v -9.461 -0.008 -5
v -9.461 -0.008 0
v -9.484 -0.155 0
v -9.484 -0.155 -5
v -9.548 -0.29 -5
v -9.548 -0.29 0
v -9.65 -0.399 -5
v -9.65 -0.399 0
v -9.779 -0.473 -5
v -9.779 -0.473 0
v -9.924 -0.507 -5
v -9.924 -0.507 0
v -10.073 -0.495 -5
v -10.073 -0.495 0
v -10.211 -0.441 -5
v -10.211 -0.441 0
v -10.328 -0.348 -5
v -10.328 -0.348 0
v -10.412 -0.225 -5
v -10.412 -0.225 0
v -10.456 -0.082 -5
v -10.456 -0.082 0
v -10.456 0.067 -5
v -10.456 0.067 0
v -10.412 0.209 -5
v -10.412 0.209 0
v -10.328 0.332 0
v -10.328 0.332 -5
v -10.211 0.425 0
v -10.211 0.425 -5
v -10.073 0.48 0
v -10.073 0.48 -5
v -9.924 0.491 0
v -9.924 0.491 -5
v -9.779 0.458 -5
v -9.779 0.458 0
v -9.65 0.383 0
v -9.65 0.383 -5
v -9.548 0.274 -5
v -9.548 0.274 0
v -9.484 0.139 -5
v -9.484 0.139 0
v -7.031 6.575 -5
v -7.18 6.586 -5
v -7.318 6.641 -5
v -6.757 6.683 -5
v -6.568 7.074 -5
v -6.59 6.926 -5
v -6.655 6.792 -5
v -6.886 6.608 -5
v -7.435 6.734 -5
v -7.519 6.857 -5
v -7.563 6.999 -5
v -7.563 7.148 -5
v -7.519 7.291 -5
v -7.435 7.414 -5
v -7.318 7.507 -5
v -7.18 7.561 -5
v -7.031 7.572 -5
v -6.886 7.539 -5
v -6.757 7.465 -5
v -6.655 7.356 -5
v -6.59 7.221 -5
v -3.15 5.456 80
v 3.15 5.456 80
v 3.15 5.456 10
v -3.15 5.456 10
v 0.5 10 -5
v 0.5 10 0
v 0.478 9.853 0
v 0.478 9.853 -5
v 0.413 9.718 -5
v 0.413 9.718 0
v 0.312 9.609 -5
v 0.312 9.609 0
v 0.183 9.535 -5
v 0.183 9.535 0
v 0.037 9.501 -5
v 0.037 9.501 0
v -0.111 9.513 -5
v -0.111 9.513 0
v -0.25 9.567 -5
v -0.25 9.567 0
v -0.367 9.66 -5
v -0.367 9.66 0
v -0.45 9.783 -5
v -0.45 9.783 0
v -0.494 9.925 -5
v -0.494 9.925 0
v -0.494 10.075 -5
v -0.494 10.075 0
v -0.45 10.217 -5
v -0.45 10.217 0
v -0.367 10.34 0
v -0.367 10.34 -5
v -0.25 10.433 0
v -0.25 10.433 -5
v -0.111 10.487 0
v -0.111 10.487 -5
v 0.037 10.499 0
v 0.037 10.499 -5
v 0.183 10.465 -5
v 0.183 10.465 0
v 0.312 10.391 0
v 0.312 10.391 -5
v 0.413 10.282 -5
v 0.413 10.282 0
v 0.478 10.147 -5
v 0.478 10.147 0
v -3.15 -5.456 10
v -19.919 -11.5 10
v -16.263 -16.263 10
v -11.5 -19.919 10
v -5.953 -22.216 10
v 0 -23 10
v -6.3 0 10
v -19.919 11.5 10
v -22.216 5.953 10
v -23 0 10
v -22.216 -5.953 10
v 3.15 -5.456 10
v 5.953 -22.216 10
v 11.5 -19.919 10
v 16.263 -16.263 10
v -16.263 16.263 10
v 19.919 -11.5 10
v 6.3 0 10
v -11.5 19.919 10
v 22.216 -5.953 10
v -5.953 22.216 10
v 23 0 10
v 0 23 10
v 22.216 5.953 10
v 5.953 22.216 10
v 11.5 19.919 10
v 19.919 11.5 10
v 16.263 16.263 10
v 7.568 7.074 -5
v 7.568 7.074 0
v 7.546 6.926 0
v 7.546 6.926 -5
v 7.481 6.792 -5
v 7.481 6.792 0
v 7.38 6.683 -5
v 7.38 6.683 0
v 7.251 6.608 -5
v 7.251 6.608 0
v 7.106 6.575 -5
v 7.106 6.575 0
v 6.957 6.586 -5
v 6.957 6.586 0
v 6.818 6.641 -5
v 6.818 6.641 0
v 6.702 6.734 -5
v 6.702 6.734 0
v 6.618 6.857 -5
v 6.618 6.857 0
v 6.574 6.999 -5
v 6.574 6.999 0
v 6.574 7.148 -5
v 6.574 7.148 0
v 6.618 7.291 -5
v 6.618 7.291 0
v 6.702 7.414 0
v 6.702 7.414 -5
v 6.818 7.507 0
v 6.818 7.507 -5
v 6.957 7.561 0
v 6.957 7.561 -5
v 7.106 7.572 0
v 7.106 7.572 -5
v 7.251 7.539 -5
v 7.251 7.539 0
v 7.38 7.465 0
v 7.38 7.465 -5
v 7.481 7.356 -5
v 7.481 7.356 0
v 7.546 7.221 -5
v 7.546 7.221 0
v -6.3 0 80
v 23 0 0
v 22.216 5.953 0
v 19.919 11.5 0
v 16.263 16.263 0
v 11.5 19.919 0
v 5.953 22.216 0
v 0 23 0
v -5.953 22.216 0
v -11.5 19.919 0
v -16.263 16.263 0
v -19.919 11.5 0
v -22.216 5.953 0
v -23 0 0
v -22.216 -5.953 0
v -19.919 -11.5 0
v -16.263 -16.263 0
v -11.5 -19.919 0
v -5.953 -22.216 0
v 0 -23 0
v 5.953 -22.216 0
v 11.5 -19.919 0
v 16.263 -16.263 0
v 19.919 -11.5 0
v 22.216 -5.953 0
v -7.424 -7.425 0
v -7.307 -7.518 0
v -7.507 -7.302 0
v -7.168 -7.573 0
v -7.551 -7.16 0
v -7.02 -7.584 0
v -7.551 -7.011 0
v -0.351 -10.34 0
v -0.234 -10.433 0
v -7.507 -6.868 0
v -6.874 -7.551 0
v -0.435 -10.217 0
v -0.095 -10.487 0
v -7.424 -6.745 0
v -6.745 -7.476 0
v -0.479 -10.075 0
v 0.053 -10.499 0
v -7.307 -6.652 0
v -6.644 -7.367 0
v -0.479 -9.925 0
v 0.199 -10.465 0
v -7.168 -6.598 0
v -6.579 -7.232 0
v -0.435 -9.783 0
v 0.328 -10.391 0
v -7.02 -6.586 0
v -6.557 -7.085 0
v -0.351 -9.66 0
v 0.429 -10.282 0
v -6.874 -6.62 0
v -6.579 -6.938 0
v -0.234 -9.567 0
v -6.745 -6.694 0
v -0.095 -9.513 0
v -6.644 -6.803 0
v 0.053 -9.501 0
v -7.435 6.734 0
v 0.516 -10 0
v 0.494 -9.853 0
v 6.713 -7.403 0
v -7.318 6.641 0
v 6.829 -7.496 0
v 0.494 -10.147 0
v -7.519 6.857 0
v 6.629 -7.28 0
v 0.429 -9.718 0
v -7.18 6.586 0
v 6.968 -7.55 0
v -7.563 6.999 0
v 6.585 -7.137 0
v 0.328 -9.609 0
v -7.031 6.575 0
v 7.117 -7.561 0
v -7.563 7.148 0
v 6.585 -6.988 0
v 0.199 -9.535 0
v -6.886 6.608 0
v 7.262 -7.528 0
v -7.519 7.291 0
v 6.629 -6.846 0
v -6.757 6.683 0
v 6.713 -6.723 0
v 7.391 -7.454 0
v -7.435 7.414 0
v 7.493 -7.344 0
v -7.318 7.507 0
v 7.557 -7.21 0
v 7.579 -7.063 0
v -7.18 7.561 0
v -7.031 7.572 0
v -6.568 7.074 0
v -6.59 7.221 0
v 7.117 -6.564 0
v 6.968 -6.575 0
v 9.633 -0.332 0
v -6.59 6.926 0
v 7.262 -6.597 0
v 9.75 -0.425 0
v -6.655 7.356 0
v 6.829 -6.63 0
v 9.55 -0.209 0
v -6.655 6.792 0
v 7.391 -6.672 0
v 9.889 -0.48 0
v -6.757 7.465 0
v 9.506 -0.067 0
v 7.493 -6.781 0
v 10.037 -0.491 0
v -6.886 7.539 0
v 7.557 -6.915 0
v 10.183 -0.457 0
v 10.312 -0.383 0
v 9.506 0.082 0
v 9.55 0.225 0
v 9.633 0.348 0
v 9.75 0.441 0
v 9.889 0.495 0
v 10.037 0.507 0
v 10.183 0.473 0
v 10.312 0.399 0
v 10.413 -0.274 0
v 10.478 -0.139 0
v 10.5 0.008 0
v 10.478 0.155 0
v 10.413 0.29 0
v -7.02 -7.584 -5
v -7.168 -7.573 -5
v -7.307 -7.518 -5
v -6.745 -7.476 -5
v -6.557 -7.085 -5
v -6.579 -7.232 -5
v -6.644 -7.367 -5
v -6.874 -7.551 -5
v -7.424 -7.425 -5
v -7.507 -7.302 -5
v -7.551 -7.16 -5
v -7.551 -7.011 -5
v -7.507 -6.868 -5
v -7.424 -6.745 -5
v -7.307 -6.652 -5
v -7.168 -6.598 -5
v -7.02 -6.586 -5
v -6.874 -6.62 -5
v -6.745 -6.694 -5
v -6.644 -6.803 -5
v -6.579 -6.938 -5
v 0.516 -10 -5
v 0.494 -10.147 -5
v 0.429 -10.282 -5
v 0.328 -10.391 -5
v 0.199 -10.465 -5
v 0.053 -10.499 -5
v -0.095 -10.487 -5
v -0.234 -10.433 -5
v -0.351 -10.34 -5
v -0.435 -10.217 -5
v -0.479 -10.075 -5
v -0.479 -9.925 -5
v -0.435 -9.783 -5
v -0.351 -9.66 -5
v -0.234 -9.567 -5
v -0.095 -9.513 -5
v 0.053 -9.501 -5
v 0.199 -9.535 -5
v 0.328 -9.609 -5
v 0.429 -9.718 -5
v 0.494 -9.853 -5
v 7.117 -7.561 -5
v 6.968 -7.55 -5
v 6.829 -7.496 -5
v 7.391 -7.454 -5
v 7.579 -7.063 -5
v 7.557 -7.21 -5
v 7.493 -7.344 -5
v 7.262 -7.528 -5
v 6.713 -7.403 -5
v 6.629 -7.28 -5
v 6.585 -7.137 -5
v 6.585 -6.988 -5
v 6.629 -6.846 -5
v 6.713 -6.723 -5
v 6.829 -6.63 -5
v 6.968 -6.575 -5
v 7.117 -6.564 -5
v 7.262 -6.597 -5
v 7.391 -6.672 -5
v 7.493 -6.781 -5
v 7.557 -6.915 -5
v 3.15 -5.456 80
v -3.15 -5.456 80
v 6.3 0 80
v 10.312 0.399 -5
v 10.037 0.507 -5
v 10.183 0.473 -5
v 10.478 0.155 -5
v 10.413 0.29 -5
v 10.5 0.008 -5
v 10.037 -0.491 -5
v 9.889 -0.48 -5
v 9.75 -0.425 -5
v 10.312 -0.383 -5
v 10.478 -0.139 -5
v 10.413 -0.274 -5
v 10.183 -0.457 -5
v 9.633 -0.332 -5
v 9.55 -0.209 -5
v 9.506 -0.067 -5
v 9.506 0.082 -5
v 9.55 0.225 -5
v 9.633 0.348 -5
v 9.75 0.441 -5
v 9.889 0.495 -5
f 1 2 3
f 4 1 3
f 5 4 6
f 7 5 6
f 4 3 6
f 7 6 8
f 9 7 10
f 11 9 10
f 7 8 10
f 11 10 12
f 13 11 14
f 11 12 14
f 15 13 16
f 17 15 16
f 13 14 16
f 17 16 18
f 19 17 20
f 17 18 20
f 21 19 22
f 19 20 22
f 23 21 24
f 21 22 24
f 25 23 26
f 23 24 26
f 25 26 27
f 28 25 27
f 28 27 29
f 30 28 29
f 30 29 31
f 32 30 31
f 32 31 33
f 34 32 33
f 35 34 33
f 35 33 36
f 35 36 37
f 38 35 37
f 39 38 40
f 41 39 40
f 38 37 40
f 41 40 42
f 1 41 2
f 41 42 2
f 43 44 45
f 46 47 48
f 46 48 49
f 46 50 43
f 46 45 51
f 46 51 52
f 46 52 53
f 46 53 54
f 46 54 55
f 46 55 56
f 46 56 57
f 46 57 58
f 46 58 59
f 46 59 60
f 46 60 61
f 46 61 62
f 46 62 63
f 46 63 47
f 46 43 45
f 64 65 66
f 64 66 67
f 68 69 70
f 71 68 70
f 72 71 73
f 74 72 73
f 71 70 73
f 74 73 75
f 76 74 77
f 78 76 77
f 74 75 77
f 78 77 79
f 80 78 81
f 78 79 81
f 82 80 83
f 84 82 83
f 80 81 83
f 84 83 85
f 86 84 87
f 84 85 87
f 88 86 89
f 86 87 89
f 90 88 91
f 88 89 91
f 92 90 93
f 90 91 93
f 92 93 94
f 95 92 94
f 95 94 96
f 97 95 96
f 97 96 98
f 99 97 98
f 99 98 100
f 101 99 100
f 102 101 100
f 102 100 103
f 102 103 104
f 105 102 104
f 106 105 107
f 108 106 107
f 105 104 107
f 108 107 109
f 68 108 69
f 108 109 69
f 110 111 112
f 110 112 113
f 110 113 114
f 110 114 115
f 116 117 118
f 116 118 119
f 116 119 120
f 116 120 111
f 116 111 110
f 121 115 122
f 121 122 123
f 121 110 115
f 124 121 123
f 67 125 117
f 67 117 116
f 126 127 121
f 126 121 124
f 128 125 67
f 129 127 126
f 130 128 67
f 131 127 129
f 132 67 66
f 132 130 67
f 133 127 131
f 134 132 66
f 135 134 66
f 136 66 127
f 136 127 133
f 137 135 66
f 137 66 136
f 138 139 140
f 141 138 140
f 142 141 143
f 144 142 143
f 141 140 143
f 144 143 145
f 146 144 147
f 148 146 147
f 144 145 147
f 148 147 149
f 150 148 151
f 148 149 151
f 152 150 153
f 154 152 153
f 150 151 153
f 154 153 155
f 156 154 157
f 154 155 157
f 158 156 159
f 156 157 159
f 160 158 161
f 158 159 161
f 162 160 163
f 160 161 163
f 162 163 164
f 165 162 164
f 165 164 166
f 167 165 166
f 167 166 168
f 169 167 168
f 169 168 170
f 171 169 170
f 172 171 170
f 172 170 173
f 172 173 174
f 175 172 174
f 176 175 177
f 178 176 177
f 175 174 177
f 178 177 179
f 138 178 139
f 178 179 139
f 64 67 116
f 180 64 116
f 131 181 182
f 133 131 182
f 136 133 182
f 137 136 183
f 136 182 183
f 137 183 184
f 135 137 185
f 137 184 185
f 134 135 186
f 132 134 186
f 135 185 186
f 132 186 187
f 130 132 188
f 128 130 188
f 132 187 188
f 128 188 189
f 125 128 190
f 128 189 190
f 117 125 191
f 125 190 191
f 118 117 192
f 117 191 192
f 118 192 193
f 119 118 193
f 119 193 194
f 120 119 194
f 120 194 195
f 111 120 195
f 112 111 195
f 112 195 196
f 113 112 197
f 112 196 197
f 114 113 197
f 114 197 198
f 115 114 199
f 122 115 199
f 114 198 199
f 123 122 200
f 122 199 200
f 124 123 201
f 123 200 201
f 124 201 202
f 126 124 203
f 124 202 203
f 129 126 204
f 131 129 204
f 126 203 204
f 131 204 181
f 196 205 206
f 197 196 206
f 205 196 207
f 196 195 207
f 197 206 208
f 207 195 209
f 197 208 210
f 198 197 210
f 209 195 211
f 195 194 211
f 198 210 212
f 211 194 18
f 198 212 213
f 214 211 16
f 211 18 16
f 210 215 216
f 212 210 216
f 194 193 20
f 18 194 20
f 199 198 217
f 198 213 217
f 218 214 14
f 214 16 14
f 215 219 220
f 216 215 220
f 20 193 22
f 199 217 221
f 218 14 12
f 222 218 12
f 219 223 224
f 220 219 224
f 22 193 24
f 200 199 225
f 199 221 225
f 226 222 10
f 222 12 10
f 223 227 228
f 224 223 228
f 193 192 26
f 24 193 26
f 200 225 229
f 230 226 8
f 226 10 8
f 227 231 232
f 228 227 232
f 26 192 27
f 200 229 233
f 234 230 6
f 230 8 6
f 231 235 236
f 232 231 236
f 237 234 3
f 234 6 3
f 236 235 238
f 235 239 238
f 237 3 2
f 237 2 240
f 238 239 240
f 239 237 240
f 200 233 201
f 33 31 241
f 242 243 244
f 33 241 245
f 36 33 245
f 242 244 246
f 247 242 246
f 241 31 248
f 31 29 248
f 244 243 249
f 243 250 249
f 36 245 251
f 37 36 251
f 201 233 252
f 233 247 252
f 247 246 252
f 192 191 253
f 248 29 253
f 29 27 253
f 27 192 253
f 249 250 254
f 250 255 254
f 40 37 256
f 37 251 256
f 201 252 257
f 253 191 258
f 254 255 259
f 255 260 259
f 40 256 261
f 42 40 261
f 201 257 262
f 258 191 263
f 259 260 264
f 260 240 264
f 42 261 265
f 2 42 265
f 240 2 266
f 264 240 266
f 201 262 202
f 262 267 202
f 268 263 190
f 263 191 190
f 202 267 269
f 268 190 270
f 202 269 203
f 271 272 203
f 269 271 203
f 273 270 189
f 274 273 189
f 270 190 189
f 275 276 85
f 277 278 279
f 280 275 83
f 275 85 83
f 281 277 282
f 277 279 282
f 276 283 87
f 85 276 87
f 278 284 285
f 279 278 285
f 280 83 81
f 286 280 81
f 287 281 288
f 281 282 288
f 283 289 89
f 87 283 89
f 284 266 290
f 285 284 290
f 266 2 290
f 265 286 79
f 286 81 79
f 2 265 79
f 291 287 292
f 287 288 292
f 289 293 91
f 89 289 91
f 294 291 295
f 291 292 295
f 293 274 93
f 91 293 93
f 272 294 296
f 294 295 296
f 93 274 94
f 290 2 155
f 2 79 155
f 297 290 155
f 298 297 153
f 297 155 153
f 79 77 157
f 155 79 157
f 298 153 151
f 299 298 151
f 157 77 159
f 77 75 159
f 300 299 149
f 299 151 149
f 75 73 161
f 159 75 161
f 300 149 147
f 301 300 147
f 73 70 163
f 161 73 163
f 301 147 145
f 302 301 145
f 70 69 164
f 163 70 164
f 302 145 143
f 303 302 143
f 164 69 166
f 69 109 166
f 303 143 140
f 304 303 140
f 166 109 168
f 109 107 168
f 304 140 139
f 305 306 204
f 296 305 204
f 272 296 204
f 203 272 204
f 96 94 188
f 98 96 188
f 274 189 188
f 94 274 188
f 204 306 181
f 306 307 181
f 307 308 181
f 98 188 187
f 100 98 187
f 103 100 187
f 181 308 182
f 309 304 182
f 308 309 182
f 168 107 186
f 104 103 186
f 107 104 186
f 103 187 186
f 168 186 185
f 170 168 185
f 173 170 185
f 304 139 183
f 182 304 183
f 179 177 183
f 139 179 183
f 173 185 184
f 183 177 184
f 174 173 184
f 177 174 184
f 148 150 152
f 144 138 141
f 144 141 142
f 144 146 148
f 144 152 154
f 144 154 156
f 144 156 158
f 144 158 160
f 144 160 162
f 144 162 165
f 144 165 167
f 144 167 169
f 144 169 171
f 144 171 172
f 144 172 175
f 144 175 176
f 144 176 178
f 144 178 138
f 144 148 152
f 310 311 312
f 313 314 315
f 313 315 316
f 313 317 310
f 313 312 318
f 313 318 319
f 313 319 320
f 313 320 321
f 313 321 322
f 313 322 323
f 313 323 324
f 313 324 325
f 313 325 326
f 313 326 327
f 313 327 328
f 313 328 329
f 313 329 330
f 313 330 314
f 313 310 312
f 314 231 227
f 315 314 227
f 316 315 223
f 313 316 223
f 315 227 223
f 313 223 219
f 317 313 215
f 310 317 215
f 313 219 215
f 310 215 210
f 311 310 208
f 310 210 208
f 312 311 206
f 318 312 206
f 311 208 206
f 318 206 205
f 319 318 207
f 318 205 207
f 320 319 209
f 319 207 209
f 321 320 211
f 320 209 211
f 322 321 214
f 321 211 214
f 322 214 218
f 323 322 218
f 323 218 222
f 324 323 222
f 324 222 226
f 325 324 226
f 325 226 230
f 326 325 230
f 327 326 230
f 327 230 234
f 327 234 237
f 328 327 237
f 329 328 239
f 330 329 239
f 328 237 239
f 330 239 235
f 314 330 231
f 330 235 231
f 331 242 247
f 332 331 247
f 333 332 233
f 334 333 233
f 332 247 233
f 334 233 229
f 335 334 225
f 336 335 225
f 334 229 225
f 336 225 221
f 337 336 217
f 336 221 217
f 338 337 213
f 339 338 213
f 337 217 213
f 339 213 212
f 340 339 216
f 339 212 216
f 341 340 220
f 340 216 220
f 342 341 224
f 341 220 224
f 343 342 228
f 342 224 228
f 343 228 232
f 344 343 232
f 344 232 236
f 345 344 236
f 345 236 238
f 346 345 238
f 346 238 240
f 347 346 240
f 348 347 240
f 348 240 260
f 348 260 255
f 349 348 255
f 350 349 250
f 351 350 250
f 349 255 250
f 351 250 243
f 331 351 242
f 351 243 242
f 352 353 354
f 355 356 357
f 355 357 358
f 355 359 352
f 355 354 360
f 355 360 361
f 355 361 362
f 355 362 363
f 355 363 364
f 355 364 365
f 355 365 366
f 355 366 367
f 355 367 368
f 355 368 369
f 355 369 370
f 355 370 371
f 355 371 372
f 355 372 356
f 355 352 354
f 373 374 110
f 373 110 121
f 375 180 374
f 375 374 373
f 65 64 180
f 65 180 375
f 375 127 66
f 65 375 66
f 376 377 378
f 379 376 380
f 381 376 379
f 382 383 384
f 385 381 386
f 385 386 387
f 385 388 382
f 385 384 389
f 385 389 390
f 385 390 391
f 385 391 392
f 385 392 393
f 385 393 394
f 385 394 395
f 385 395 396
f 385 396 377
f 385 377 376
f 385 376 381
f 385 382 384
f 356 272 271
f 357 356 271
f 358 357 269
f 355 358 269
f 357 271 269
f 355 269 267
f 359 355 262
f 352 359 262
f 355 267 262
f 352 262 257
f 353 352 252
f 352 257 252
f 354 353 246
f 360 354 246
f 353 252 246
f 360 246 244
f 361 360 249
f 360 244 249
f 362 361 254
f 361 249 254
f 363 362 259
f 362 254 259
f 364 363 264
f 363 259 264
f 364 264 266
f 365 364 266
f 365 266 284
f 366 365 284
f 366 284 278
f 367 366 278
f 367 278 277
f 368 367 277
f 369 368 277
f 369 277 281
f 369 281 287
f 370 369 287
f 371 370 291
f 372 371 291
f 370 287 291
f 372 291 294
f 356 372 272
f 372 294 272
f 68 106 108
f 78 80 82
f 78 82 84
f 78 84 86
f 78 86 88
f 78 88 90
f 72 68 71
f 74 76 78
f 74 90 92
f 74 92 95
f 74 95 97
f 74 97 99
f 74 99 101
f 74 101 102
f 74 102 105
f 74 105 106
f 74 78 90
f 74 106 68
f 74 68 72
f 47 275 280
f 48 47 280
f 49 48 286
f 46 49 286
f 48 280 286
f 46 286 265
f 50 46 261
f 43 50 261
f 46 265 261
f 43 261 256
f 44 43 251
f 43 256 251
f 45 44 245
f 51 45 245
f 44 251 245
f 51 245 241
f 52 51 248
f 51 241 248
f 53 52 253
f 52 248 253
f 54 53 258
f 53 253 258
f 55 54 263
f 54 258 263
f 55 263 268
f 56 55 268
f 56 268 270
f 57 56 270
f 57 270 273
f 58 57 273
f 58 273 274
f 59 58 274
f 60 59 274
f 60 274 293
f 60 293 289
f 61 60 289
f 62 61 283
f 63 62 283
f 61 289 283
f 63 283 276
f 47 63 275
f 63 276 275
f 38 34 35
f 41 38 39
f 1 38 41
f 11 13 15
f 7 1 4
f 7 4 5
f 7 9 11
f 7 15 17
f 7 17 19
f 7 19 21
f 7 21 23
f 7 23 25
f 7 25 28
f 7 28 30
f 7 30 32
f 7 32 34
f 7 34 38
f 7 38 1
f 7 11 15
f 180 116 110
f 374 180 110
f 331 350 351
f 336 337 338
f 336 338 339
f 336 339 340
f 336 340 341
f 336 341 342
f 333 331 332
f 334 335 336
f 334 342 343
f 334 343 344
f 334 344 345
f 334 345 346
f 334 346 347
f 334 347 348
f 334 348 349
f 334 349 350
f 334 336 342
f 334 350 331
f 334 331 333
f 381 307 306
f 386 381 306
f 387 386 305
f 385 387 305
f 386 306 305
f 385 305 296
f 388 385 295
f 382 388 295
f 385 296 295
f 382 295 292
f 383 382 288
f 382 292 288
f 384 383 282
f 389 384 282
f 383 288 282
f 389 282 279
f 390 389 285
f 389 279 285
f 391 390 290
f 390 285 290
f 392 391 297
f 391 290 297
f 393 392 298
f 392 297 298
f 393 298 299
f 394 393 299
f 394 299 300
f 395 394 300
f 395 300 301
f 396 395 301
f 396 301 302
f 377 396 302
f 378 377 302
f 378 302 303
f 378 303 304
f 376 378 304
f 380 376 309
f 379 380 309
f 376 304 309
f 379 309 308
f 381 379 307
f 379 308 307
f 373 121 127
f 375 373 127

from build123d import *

# Parameters (mm, degrees)
SKETCH2_R           = 23
BOSS_EXTRUDE1_DEPTH = 10
BOSS_EXTRUDE2_DEPTH = 80
SKETCH5_R           = 0.5
BOSS_EXTRUDE3_DEPTH = 5


with BuildPart() as part:
    # Sketch2 → Boss-Extrude1 (new body)
    with BuildSketch(Plane.XY):
        Circle(SKETCH2_R)
        Polygon((-6.3, 0), (-3.15, -5.455960044), (3.15, -5.455960044), (6.3, 0), (3.15, 5.455960044), (-3.15, 5.455960044), align=None, mode=Mode.SUBTRACT)
    extrude(amount=BOSS_EXTRUDE1_DEPTH)

    # Sketch2<2> → Boss-Extrude2 (add)
    with BuildSketch(Plane.XY):
        Polygon((-3.15, 5.455960044), (-6.3, 0), (-3.15, -5.455960044), (3.15, -5.455960044), (6.3, 0), (3.15, 5.455960044), align=None)
    extrude(amount=BOSS_EXTRUDE2_DEPTH)

    # Sketch5 → Boss-Extrude3 (add)
    with BuildSketch(Plane(origin=(0, 0, 0), x_dir=(-1, 0, 0), z_dir=(0, 0, -1))):
        with Locations((0, 10)):
            Circle(SKETCH5_R)
        with Locations((-7.068259509, 7.073875)):
            Circle(SKETCH5_R)
        with Locations((7.068259509, 7.073875)):
            Circle(SKETCH5_R)
        with Locations((-9.999996847, 0.007941503)):
            Circle(SKETCH5_R)
        with Locations((-7.07948603, -7.06263956)):
            Circle(SKETCH5_R)
        with Locations((-0.015888246, -10)):
            Circle(SKETCH5_R)
        with Locations((7.057007753, -7.08509997)):
            Circle(SKETCH5_R)
        with Locations((9.961481677, -0.007916121)):
            Circle(SKETCH5_R)
    extrude(amount=BOSS_EXTRUDE3_DEPTH)


solid = part.part
